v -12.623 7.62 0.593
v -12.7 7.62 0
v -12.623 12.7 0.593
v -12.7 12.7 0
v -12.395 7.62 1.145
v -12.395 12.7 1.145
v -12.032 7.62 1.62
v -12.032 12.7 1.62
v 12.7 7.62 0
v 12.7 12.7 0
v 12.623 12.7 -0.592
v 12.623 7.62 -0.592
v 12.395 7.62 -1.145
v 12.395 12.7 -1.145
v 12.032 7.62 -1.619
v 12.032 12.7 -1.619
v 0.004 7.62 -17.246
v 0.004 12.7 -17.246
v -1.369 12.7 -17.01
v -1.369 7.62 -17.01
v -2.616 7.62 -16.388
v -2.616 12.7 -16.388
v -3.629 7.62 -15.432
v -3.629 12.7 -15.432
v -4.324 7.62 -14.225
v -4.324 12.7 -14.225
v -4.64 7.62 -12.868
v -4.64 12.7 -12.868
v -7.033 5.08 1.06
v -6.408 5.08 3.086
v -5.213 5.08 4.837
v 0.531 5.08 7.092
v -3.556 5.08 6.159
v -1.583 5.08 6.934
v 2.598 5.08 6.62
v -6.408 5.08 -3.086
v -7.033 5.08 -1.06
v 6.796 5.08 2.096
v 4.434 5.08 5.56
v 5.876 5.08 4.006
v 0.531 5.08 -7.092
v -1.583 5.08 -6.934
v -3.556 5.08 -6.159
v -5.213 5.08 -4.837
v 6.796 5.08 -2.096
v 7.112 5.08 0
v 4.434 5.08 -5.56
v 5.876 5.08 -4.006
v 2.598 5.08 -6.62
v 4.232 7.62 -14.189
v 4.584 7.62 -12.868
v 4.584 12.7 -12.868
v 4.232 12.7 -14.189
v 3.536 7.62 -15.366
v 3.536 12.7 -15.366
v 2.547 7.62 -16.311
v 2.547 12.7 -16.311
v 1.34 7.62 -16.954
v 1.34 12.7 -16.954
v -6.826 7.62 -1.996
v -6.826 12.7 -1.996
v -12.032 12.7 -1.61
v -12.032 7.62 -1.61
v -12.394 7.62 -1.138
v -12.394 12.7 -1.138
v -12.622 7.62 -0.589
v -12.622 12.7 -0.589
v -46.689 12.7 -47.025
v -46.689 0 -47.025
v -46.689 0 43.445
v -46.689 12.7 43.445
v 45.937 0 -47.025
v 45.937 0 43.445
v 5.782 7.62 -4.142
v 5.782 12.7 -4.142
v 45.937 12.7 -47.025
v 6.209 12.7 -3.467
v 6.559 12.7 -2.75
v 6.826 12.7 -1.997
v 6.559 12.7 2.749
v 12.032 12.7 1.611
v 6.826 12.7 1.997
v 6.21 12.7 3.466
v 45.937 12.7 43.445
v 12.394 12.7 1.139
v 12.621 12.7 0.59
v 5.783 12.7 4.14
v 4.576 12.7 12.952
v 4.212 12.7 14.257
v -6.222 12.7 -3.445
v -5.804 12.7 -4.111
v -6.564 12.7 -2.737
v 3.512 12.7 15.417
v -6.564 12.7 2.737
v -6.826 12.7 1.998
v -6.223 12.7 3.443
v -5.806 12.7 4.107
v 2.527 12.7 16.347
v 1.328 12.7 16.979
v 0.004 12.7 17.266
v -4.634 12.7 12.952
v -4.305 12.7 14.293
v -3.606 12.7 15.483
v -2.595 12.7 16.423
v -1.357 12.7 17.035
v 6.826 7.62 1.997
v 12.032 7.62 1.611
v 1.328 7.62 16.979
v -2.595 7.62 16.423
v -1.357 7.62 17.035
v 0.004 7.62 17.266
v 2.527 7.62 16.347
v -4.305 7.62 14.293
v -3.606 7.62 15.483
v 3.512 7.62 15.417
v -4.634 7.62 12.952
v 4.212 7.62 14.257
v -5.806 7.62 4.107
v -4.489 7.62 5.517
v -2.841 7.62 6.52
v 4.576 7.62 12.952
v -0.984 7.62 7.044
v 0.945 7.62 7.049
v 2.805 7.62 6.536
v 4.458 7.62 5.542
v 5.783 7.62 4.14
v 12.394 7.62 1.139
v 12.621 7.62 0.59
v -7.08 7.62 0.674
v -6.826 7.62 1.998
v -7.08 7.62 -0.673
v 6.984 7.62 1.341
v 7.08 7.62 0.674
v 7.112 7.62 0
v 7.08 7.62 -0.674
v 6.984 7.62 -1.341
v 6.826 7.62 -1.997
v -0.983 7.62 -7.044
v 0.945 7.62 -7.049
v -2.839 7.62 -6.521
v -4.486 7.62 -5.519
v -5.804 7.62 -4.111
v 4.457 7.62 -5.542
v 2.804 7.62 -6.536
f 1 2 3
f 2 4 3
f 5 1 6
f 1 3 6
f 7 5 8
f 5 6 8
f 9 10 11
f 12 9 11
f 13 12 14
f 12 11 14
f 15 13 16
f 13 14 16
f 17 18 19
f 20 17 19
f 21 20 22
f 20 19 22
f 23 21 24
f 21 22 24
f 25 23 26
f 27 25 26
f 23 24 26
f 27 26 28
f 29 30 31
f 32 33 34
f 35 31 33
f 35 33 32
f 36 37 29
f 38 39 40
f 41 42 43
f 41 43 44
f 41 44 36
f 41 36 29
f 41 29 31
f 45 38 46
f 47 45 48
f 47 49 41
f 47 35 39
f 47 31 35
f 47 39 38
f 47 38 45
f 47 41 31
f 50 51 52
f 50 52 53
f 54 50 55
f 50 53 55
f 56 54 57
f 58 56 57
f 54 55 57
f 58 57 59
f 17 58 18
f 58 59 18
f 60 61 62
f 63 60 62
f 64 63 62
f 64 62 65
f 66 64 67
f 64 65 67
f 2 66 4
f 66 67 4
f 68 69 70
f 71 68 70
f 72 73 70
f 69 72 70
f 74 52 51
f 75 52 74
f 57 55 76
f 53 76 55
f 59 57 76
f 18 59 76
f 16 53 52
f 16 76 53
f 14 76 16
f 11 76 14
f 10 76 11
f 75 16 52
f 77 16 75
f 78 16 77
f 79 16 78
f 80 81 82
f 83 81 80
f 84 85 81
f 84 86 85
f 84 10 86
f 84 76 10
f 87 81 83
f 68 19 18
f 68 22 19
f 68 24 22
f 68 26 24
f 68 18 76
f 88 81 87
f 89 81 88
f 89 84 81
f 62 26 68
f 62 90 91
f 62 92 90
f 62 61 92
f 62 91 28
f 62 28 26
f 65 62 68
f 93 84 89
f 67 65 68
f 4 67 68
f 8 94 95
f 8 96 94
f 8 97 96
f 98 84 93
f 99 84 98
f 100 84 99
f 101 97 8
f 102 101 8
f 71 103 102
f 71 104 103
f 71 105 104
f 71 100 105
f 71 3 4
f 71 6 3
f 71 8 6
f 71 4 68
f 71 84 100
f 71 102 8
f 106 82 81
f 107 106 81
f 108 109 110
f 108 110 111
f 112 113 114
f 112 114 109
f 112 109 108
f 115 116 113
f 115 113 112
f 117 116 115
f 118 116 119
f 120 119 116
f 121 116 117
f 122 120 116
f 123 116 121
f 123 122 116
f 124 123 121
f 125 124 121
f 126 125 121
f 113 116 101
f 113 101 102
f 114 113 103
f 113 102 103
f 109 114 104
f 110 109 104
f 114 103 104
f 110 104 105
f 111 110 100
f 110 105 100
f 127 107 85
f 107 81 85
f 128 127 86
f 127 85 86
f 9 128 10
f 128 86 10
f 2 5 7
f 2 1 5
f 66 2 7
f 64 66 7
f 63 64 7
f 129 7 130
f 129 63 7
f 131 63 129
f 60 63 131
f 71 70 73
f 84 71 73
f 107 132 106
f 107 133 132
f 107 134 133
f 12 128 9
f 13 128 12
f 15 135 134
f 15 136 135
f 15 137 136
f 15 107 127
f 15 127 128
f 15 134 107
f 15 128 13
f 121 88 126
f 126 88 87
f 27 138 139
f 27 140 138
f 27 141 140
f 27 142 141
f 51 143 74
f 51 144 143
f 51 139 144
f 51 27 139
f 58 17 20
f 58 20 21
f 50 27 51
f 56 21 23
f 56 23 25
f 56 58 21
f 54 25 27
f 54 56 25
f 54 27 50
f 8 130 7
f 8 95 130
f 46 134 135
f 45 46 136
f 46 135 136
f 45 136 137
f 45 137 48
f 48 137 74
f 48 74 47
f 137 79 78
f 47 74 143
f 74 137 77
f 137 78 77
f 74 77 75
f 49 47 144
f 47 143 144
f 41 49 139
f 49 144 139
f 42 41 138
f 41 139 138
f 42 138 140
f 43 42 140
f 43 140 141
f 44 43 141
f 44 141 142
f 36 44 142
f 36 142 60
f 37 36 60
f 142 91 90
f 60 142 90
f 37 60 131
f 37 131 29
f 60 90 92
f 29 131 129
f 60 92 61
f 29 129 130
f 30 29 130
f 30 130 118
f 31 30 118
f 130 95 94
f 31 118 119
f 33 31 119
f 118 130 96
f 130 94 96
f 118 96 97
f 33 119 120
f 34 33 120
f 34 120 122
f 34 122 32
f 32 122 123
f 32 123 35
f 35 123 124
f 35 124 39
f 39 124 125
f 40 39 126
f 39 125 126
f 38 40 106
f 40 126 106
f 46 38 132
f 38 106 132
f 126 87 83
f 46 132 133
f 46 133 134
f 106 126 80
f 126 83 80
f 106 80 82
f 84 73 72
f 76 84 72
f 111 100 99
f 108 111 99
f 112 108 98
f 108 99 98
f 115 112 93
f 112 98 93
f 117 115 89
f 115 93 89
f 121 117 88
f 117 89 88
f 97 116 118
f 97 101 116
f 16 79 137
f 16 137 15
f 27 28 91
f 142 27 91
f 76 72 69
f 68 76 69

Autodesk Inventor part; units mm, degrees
ref_plane "YZ Plane" through (0, 0, 0) normal (1, 0, 0) x (0, 1, 0)
ref_plane "XZ Plane" through (0, 0, 0) normal (0, 1, 0) x (-1, 0, 0)
ref_plane "XY Plane" through (0, 0, 0) normal (0, 0, 1) x (1, 0, 0)
sketch "Sketch1" plane through (0, 0, 0) normal (0, 1, 0) x (-1, 0, 0)
  line L0 (46.6892, 43.4449) -> (-45.937, 43.4449)
  line L1 (-45.937, 43.4449) -> (-45.937, -47.0251)
  line L2 (-45.937, -47.0251) -> (46.6892, -47.0251)
  line L3 (46.6892, -47.0251) -> (46.6892, 43.4449)
  point P0 (0, 0)
extrude "Extrusion1" add sketch "Sketch1" along normal blind 12.7
sketch "Sketch2" plane through (0, 12.7, 0) normal (0, 1, 0) x (1, 0, 0)
  line L0 (-4.6344, -12.9521) -> (-6.35, -0.0003)
  line L1 (-4.6344, -12.9521) -> (0.0041, -12.9521)
  line L2 (0.0041, -12.9521) -> (4.5761, -12.9521)
  line L3 (4.5761, -12.9521) -> (6.35, -0.0003)
  arc A0 (0.004, -17.2664) -> (4.5761, -12.9521) centre (-0.3869, -12.2723) ccw
  arc A1 (-4.6344, -12.9521) -> (0.004, -17.2664) centre (0.1159, -12.4955) ccw
  line L4 (-4.6401, 12.8677) -> (0.0124, 12.8677)
  line L5 (0.0124, 12.8677) -> (4.5844, 12.8677)
  arc A2 (0.0041, 17.2458) -> (-4.6401, 12.8677) centre (0.1159, 12.4749) ccw
  arc A3 (4.5844, 12.8677) -> (0.0041, 17.2458) centre (-0.3881, 12.2505) ccw
  line L6 (4.5844, 12.8677) -> (6.35, -0.0003)
  line L7 (-4.6401, 12.8677) -> (-6.35, -0.0003)
  line L8 (-6.35, -0.0003) -> (-12.7, -0.0003)
  line L9 (6.35, -0.0003) -> (12.7, -0.0003)
  arc A4 (-12.7, -0.0003) -> (-12.0319, -1.6197) centre (-10.414, -0.0048) ccw
  line L10 (-6.35, -2.0323) -> (-12.0319, -1.6197)
  line L11 (-6.35, 2.0317) -> (-12.0319, 1.6102)
  arc A5 (-12.0319, 1.6102) -> (-12.7, -0.0092) centre (-10.414, -0.0048) ccw
  line L12 (-6.35, -2.0323) -> (-6.0808, -2.0323)
  line L13 (-6.35, 2.0317) -> (-6.08, 2.0317)
  line L14 (6.35, -0.0003) -> (12.7, -0.0003)
  arc A6 (12.7, -0.0003) -> (12.0319, 1.6191) centre (10.414, 0.0041) ccw
  line L15 (6.35, 2.0317) -> (12.0319, 1.6191)
  line L16 (6.35, -2.0323) -> (12.0319, -1.6108)
  arc A7 (12.0319, -1.6108) -> (12.7, 0.0085) centre (10.414, 0.0041) ccw
  line L17 (6.35, -2.0323) -> (6.0717, -2.0323)
  line L18 (6.35, 2.0317) -> (6.0712, 2.0317)
  point P0 (0, 0)
  point P1 (0.6686, -44.2967)
  point P2 (0.0037, 25.7566)
  point P3 (-0.0257, 7.5764)
  point P4 (0.0037, -0.0211)
  point P5 (12.0319, 1.6191)
  dimension "d12" = 4.572
  dimension "d16" = 4.572
  dimension "d20" = 2.032
  dimension "d21" = 2.032
  dimension "d22" = 2.286
  dimension "d25" = 2.032
extrude "Extrusion2" cut sketch "Sketch2" against normal blind 5.08
sketch "Sketch3" plane through (0, 12.7, 0) normal (0, 1, 0) x (1, 0, 0)
  circle A0 centre (0, 0) radius 7.112
  dimension "d30" = 14.224
extrude "Extrusion3" cut sketch "Sketch3" against normal blind 7.62
